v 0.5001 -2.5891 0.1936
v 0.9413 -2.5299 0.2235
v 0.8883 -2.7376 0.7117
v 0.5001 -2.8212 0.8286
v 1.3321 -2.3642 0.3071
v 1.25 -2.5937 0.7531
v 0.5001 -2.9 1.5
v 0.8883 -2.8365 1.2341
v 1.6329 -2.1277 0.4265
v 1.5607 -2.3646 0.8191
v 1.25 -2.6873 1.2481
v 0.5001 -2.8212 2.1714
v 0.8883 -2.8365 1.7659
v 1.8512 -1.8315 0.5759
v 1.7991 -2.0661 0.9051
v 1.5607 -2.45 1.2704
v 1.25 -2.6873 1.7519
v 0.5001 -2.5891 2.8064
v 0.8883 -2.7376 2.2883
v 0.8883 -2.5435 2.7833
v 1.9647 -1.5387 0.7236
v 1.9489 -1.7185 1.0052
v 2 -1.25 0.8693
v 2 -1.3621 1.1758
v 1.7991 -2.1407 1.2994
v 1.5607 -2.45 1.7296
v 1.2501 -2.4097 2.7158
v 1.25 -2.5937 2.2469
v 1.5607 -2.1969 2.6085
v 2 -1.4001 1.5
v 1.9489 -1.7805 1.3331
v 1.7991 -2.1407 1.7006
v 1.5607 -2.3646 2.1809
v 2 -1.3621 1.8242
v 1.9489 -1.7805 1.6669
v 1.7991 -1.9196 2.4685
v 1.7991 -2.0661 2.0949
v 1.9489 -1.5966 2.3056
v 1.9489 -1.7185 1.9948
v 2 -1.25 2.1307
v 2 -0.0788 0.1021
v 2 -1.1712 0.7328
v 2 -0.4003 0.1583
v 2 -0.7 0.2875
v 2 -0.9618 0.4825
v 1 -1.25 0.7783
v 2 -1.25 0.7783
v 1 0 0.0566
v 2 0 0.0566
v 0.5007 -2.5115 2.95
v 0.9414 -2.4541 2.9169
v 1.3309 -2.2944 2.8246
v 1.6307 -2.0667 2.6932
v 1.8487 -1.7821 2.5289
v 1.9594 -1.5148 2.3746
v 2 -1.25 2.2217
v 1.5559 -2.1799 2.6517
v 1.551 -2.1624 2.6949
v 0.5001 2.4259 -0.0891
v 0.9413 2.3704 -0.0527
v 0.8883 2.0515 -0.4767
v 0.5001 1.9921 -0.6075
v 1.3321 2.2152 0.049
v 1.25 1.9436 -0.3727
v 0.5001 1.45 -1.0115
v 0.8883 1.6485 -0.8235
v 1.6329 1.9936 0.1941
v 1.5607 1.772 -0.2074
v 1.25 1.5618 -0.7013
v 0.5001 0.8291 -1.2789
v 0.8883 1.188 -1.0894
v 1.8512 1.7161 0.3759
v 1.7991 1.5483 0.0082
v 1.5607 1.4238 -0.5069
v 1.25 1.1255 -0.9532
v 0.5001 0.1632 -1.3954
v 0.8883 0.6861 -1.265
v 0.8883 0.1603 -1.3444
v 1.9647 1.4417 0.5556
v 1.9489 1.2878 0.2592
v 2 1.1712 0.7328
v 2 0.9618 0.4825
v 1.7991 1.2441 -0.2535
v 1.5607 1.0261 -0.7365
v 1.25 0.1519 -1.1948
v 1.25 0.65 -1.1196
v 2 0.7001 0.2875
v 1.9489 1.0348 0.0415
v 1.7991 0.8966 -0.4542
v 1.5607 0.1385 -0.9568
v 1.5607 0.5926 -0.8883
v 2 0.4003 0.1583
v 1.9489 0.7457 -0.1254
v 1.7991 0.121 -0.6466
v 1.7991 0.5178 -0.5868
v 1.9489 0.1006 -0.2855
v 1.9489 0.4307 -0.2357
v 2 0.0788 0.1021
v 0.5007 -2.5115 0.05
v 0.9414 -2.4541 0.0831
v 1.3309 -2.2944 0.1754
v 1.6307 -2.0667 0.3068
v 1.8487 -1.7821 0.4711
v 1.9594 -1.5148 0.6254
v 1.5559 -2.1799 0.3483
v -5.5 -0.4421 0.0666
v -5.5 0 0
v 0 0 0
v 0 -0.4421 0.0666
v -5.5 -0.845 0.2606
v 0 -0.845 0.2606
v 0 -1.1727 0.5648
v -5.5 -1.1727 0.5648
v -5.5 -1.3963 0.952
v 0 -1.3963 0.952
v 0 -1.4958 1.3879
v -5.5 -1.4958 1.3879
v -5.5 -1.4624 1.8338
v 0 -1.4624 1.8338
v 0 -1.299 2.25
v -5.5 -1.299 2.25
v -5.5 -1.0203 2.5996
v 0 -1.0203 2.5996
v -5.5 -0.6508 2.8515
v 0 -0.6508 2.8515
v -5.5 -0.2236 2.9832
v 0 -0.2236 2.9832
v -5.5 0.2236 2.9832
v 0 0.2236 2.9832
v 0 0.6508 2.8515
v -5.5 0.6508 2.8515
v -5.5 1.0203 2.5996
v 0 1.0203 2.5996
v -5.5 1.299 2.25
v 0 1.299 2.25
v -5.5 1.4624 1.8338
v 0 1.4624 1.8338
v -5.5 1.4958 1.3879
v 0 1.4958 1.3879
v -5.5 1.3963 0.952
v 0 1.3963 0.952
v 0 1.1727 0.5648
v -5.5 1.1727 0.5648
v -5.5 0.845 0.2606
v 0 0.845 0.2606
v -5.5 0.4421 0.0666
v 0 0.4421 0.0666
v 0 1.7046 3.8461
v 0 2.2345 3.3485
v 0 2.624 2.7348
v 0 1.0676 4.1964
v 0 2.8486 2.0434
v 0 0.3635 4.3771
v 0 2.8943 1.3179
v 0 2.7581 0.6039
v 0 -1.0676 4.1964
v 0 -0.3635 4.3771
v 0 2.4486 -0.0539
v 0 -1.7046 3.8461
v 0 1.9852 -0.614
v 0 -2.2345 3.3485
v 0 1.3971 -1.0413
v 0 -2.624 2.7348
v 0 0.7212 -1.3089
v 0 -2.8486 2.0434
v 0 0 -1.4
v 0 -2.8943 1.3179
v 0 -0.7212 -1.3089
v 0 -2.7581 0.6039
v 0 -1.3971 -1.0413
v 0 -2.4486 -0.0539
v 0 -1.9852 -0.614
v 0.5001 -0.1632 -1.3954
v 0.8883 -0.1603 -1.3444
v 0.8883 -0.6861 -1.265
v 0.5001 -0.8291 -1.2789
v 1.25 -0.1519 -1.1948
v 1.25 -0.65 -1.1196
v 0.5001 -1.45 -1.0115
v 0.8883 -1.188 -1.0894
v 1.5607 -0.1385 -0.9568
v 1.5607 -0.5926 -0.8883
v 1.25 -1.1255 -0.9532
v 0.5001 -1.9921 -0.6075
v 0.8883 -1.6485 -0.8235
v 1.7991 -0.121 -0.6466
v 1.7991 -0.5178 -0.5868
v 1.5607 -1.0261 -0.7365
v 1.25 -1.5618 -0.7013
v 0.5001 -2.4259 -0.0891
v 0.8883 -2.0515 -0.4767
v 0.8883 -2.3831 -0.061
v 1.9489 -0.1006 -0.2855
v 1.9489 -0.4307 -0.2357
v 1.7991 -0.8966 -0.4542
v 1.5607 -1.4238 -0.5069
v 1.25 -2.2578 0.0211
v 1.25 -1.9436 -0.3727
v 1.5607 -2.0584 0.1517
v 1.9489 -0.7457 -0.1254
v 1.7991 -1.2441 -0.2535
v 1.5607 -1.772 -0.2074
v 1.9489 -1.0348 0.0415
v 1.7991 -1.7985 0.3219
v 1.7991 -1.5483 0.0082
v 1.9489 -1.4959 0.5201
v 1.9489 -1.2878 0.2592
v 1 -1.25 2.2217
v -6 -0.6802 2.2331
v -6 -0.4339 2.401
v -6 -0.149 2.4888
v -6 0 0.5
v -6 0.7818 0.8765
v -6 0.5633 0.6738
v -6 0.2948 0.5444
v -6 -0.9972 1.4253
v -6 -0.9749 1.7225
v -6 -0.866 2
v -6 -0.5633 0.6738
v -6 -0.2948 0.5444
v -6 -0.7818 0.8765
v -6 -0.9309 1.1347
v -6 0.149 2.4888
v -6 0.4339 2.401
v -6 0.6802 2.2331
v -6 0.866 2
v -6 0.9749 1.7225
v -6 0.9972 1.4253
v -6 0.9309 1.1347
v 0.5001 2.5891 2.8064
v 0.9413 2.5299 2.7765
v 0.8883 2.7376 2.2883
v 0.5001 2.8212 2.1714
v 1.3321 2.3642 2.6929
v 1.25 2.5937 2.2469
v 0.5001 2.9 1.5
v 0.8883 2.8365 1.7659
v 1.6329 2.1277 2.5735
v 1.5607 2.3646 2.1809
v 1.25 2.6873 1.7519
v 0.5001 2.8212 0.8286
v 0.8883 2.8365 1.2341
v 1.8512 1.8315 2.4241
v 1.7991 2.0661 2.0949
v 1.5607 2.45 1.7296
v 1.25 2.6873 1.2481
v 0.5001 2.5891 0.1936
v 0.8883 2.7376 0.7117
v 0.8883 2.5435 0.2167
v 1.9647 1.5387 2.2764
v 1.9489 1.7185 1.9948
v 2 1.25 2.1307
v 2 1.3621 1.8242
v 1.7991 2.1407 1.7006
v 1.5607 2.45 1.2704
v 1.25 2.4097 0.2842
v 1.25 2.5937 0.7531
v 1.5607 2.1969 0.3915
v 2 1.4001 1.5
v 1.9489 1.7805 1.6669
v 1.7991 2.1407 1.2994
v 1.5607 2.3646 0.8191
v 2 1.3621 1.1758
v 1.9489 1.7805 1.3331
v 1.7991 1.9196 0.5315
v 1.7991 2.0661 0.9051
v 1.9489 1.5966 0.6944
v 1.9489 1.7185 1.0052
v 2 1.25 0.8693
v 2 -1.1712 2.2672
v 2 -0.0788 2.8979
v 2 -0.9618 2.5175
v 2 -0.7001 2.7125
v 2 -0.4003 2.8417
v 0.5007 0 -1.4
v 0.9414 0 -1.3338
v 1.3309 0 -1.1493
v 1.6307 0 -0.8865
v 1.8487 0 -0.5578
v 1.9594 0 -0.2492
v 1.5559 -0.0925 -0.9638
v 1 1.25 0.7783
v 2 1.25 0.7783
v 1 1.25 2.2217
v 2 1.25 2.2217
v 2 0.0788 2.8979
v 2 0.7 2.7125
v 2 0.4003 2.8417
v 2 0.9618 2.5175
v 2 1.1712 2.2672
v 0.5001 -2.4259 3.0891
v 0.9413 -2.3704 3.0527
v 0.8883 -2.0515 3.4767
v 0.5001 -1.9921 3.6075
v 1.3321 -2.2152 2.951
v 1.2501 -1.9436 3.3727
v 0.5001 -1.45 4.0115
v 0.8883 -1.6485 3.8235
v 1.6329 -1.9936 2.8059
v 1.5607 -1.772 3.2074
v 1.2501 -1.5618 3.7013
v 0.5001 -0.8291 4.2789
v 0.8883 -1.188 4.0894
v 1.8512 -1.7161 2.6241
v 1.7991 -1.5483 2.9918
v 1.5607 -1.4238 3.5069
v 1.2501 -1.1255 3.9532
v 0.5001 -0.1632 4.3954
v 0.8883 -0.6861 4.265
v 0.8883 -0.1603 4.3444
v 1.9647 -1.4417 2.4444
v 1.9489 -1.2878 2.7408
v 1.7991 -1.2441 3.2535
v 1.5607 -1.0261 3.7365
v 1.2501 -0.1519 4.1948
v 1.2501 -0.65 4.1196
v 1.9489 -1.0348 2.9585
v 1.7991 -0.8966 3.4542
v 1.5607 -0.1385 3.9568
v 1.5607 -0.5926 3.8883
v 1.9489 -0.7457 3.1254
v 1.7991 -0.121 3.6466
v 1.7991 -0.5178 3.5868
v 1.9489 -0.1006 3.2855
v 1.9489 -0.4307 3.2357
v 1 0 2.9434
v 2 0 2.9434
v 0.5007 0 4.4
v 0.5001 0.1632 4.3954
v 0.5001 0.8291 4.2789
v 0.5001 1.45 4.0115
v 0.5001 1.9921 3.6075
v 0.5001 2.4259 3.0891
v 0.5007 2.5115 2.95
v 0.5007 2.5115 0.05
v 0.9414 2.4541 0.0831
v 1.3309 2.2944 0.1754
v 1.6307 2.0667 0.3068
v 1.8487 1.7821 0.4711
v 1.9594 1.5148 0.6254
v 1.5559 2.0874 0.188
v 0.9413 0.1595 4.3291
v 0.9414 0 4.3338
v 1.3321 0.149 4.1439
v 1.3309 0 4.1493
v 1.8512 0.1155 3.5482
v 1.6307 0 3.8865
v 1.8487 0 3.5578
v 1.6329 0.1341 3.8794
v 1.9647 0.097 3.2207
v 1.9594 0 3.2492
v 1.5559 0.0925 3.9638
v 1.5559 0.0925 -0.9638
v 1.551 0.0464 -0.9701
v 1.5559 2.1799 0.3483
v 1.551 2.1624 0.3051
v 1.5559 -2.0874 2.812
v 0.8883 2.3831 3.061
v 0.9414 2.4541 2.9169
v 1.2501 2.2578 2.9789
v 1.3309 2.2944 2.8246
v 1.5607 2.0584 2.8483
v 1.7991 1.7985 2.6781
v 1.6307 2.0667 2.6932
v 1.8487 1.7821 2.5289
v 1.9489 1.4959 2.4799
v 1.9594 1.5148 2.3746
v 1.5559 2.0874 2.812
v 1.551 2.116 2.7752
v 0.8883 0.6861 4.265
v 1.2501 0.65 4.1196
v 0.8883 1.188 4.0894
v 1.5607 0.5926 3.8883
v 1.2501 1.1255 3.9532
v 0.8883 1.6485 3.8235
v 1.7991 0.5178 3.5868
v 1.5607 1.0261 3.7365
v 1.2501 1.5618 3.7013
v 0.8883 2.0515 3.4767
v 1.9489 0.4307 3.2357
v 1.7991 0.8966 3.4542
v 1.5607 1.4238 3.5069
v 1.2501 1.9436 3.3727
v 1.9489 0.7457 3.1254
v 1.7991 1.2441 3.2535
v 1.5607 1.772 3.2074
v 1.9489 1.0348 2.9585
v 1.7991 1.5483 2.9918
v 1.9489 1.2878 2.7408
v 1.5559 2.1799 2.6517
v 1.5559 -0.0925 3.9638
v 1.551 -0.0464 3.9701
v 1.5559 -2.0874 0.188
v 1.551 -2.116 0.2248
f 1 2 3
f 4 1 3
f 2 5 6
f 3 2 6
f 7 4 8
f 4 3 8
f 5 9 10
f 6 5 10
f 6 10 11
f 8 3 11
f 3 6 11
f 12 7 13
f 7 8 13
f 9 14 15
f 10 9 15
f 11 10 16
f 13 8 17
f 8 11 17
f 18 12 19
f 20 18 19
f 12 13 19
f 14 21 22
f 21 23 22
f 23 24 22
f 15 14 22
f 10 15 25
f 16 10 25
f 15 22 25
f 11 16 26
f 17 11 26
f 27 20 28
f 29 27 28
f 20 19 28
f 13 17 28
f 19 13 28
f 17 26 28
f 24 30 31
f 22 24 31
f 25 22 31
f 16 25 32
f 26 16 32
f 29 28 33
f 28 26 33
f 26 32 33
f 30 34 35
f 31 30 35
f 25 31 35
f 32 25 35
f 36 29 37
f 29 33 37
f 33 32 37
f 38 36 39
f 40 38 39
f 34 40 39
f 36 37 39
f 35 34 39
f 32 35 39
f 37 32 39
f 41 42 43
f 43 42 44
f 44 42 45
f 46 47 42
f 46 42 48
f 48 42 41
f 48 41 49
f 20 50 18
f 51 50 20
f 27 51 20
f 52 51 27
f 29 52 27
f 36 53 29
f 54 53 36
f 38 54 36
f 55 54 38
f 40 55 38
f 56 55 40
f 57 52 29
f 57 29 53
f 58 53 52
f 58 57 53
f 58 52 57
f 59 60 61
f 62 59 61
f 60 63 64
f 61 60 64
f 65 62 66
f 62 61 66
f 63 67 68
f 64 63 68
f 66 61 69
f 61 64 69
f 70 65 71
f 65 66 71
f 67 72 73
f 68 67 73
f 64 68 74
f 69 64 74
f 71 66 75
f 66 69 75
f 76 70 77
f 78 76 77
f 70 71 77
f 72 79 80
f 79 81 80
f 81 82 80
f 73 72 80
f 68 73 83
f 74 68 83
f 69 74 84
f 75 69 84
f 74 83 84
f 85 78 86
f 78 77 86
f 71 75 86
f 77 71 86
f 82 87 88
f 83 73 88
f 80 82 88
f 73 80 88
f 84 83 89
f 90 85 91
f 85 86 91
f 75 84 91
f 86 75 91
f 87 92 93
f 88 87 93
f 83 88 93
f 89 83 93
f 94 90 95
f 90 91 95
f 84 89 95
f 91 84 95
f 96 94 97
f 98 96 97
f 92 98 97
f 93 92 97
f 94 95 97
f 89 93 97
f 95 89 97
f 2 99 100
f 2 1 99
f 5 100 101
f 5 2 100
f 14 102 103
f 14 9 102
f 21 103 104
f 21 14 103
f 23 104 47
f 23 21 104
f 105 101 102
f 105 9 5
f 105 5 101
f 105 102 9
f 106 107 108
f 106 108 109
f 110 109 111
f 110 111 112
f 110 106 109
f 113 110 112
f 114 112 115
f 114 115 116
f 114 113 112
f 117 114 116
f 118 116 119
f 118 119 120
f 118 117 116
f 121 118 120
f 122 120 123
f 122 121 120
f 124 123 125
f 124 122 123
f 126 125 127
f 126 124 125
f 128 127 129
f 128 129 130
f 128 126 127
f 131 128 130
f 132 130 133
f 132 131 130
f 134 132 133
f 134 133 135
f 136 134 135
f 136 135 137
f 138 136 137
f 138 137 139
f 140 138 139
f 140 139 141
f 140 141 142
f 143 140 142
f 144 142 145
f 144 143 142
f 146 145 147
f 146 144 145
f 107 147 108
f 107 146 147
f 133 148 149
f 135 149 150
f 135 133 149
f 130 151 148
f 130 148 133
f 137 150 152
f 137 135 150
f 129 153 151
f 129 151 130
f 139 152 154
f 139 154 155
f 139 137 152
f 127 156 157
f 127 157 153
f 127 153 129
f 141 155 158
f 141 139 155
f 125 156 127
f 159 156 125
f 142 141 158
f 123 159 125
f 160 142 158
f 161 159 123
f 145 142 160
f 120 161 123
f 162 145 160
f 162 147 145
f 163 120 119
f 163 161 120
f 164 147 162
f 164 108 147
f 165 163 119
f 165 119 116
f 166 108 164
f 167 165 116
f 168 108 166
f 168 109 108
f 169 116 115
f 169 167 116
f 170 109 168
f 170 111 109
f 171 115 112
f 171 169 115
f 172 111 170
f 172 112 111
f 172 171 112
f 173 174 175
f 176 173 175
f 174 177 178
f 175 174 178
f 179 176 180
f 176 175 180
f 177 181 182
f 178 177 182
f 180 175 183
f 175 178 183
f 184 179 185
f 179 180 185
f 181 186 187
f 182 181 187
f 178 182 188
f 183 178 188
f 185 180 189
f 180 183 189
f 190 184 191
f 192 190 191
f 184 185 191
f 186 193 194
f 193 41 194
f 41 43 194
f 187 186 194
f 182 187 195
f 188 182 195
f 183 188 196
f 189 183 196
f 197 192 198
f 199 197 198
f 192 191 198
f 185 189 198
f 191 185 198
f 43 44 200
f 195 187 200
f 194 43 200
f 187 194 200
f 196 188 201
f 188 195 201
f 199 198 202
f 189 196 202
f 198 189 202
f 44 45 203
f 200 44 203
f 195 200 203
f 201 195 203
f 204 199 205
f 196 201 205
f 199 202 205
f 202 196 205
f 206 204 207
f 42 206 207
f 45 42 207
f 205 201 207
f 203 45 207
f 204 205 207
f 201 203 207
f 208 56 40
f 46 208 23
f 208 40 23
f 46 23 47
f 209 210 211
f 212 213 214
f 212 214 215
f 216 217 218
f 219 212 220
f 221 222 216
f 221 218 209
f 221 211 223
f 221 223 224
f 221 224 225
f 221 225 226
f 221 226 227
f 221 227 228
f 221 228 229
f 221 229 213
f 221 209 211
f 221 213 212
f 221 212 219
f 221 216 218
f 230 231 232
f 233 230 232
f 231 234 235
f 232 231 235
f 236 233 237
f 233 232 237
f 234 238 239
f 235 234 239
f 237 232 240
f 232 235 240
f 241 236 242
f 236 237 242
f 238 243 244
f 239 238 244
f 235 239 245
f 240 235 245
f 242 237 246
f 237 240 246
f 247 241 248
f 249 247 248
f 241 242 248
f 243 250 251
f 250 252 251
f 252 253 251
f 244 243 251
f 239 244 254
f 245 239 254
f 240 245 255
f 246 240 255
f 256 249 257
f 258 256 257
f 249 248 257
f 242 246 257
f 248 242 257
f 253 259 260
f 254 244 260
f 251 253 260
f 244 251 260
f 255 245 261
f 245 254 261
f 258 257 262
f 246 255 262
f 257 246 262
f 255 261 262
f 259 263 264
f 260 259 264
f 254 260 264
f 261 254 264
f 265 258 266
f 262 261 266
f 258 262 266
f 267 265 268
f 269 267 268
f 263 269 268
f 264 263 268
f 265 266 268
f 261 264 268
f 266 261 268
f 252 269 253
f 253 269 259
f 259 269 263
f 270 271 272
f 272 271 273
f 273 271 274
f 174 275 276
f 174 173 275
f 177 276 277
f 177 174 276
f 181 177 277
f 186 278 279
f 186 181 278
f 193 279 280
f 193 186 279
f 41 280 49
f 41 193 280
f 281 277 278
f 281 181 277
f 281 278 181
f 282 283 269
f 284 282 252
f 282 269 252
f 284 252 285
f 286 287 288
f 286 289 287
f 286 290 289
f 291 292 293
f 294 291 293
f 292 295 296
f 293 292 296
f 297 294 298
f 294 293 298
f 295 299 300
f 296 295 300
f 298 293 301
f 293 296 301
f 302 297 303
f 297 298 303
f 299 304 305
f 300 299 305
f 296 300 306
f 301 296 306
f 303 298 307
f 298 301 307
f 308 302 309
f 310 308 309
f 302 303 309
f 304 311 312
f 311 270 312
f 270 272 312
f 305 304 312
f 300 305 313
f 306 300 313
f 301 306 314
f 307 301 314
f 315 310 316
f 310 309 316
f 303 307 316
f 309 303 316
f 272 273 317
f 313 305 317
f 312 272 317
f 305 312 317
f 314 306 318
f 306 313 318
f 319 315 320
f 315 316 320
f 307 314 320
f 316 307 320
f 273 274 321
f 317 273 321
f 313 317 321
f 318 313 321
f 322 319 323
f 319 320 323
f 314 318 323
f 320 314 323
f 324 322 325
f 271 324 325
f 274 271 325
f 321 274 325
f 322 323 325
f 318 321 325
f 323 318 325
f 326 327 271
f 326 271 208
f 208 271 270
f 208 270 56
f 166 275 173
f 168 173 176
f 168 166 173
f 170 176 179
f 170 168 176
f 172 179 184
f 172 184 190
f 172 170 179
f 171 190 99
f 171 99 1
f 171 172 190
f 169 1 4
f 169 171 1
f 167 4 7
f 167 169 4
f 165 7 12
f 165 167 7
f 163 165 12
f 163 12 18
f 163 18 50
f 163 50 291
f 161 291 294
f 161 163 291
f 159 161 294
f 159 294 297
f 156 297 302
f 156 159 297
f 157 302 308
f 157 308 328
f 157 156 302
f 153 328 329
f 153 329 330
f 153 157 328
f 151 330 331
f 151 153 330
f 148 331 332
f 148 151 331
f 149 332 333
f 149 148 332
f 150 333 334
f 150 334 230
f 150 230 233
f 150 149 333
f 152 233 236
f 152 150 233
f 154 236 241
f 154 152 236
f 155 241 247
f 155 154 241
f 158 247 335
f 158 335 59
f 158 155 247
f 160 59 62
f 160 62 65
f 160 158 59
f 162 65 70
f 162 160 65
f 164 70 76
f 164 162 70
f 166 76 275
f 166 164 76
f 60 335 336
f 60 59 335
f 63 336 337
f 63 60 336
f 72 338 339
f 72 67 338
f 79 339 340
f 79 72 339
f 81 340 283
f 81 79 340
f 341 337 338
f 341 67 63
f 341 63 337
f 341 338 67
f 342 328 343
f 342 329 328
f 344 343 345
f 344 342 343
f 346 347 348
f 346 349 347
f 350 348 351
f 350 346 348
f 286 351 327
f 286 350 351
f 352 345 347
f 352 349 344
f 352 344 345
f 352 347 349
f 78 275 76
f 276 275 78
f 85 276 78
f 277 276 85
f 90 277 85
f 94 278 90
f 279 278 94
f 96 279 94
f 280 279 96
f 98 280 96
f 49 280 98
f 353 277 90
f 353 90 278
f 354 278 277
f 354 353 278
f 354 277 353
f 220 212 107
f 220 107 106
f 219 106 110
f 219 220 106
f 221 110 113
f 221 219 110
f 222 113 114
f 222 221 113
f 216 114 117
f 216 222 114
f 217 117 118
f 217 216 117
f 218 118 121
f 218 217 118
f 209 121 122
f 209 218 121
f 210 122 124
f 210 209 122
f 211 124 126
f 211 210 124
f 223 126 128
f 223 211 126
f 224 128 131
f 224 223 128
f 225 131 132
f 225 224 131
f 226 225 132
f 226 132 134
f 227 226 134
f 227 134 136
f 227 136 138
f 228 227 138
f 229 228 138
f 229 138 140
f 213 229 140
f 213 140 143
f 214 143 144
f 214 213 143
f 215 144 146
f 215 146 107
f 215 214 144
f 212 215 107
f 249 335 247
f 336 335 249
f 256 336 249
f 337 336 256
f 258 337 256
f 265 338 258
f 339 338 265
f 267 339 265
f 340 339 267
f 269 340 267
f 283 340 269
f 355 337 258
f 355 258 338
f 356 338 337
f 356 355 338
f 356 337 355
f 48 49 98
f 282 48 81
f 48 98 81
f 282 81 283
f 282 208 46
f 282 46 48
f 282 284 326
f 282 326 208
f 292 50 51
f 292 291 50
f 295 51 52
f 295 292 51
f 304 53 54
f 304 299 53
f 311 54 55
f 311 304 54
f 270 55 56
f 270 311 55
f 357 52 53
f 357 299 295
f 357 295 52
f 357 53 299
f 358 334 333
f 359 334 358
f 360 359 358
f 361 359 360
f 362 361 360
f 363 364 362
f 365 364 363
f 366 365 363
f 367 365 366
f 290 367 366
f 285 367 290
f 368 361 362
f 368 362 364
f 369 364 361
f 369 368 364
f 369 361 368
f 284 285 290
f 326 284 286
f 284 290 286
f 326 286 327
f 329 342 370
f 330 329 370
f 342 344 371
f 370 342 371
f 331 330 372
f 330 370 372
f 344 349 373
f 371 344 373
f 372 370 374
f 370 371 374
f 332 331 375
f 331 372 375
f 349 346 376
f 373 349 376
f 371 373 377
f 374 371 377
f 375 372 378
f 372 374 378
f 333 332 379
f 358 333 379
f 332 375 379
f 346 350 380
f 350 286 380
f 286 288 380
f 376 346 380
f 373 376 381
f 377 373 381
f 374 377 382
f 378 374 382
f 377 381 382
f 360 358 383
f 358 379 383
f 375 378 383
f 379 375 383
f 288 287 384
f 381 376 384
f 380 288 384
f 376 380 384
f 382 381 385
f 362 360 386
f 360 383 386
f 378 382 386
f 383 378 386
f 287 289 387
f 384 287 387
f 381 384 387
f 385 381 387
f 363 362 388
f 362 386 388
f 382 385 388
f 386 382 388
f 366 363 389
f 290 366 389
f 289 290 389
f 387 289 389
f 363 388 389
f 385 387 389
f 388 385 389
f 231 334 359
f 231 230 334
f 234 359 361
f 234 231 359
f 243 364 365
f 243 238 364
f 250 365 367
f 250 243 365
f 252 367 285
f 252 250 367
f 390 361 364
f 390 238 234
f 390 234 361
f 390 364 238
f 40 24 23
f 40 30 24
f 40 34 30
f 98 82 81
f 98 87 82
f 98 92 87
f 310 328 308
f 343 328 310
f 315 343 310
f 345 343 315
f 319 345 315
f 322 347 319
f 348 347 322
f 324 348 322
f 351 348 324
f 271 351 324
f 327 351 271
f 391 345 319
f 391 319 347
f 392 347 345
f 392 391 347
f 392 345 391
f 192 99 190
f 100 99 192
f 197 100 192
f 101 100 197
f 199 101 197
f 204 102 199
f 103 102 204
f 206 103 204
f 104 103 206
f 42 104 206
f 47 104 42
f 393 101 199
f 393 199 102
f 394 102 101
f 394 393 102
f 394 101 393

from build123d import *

# Parameters (mm, degrees)
CUT_EXTRUDE1_DEPTH = 1
FILLET1_R          = 1.5
CHAMFER1_SIZE      = 0.5


with BuildPart() as part:
    # Sketch1 → Revolve1 (revolve)
    with BuildSketch(Plane(origin=(0, 0, 0), x_dir=(1, 0, 0), z_dir=(0, 1, 0))):
        Polygon((0, 0), (-6, -7.3e-16), (-6, -1.5000000000000007), (1e-17, -1.5), align=None)
        Polygon((1e-17, 1.3999999999999995), (1e-17, 0), (1e-17, -1.5), (2, -1.5), (2, 1.3999999999999995), align=None)
    revolve(axis=Axis((1e-17, 0, 1.5), (-1, 0, 1.1e-16)))

    # Sketch3 → Cut-Extrude1 (cut)
    with BuildSketch(Plane(origin=(2, 0, -2.2e-16), x_dir=(-1.3e-16, 0, -1), z_dir=(1, 0, -1.3e-16))):
        Polygon((-2.2216878364870323, -1.2500000000000002), (-0.7783121635129678, -1.2500000000000002), (-0.05662432702593554, 0), (-0.7783121635129678, 1.2500000000000002), (-2.2216878364870323, 1.2500000000000004), (-2.9433756729740645, 0), align=None)
    extrude(amount=-CUT_EXTRUDE1_DEPTH, mode=Mode.SUBTRACT)

    # Fillet1
    fillet1_edges = [part.edges().sort_by_distance(p)[0] for p in [
        (2.000000000000001, -3.6e-16, 4.3999999999999995),
    ]]
    fillet(fillet1_edges, radius=FILLET1_R - 0.0001)  # a hair under: the kernel refuses the full size

    # Chamfer1
    chamfer1_edges = [part.edges().sort_by_distance(p)[0] for p in [
        (-6, -1.8e-16, 3.000000000000001),
    ]]
    chamfer(chamfer1_edges, length=CHAMFER1_SIZE)


solid = part.part
